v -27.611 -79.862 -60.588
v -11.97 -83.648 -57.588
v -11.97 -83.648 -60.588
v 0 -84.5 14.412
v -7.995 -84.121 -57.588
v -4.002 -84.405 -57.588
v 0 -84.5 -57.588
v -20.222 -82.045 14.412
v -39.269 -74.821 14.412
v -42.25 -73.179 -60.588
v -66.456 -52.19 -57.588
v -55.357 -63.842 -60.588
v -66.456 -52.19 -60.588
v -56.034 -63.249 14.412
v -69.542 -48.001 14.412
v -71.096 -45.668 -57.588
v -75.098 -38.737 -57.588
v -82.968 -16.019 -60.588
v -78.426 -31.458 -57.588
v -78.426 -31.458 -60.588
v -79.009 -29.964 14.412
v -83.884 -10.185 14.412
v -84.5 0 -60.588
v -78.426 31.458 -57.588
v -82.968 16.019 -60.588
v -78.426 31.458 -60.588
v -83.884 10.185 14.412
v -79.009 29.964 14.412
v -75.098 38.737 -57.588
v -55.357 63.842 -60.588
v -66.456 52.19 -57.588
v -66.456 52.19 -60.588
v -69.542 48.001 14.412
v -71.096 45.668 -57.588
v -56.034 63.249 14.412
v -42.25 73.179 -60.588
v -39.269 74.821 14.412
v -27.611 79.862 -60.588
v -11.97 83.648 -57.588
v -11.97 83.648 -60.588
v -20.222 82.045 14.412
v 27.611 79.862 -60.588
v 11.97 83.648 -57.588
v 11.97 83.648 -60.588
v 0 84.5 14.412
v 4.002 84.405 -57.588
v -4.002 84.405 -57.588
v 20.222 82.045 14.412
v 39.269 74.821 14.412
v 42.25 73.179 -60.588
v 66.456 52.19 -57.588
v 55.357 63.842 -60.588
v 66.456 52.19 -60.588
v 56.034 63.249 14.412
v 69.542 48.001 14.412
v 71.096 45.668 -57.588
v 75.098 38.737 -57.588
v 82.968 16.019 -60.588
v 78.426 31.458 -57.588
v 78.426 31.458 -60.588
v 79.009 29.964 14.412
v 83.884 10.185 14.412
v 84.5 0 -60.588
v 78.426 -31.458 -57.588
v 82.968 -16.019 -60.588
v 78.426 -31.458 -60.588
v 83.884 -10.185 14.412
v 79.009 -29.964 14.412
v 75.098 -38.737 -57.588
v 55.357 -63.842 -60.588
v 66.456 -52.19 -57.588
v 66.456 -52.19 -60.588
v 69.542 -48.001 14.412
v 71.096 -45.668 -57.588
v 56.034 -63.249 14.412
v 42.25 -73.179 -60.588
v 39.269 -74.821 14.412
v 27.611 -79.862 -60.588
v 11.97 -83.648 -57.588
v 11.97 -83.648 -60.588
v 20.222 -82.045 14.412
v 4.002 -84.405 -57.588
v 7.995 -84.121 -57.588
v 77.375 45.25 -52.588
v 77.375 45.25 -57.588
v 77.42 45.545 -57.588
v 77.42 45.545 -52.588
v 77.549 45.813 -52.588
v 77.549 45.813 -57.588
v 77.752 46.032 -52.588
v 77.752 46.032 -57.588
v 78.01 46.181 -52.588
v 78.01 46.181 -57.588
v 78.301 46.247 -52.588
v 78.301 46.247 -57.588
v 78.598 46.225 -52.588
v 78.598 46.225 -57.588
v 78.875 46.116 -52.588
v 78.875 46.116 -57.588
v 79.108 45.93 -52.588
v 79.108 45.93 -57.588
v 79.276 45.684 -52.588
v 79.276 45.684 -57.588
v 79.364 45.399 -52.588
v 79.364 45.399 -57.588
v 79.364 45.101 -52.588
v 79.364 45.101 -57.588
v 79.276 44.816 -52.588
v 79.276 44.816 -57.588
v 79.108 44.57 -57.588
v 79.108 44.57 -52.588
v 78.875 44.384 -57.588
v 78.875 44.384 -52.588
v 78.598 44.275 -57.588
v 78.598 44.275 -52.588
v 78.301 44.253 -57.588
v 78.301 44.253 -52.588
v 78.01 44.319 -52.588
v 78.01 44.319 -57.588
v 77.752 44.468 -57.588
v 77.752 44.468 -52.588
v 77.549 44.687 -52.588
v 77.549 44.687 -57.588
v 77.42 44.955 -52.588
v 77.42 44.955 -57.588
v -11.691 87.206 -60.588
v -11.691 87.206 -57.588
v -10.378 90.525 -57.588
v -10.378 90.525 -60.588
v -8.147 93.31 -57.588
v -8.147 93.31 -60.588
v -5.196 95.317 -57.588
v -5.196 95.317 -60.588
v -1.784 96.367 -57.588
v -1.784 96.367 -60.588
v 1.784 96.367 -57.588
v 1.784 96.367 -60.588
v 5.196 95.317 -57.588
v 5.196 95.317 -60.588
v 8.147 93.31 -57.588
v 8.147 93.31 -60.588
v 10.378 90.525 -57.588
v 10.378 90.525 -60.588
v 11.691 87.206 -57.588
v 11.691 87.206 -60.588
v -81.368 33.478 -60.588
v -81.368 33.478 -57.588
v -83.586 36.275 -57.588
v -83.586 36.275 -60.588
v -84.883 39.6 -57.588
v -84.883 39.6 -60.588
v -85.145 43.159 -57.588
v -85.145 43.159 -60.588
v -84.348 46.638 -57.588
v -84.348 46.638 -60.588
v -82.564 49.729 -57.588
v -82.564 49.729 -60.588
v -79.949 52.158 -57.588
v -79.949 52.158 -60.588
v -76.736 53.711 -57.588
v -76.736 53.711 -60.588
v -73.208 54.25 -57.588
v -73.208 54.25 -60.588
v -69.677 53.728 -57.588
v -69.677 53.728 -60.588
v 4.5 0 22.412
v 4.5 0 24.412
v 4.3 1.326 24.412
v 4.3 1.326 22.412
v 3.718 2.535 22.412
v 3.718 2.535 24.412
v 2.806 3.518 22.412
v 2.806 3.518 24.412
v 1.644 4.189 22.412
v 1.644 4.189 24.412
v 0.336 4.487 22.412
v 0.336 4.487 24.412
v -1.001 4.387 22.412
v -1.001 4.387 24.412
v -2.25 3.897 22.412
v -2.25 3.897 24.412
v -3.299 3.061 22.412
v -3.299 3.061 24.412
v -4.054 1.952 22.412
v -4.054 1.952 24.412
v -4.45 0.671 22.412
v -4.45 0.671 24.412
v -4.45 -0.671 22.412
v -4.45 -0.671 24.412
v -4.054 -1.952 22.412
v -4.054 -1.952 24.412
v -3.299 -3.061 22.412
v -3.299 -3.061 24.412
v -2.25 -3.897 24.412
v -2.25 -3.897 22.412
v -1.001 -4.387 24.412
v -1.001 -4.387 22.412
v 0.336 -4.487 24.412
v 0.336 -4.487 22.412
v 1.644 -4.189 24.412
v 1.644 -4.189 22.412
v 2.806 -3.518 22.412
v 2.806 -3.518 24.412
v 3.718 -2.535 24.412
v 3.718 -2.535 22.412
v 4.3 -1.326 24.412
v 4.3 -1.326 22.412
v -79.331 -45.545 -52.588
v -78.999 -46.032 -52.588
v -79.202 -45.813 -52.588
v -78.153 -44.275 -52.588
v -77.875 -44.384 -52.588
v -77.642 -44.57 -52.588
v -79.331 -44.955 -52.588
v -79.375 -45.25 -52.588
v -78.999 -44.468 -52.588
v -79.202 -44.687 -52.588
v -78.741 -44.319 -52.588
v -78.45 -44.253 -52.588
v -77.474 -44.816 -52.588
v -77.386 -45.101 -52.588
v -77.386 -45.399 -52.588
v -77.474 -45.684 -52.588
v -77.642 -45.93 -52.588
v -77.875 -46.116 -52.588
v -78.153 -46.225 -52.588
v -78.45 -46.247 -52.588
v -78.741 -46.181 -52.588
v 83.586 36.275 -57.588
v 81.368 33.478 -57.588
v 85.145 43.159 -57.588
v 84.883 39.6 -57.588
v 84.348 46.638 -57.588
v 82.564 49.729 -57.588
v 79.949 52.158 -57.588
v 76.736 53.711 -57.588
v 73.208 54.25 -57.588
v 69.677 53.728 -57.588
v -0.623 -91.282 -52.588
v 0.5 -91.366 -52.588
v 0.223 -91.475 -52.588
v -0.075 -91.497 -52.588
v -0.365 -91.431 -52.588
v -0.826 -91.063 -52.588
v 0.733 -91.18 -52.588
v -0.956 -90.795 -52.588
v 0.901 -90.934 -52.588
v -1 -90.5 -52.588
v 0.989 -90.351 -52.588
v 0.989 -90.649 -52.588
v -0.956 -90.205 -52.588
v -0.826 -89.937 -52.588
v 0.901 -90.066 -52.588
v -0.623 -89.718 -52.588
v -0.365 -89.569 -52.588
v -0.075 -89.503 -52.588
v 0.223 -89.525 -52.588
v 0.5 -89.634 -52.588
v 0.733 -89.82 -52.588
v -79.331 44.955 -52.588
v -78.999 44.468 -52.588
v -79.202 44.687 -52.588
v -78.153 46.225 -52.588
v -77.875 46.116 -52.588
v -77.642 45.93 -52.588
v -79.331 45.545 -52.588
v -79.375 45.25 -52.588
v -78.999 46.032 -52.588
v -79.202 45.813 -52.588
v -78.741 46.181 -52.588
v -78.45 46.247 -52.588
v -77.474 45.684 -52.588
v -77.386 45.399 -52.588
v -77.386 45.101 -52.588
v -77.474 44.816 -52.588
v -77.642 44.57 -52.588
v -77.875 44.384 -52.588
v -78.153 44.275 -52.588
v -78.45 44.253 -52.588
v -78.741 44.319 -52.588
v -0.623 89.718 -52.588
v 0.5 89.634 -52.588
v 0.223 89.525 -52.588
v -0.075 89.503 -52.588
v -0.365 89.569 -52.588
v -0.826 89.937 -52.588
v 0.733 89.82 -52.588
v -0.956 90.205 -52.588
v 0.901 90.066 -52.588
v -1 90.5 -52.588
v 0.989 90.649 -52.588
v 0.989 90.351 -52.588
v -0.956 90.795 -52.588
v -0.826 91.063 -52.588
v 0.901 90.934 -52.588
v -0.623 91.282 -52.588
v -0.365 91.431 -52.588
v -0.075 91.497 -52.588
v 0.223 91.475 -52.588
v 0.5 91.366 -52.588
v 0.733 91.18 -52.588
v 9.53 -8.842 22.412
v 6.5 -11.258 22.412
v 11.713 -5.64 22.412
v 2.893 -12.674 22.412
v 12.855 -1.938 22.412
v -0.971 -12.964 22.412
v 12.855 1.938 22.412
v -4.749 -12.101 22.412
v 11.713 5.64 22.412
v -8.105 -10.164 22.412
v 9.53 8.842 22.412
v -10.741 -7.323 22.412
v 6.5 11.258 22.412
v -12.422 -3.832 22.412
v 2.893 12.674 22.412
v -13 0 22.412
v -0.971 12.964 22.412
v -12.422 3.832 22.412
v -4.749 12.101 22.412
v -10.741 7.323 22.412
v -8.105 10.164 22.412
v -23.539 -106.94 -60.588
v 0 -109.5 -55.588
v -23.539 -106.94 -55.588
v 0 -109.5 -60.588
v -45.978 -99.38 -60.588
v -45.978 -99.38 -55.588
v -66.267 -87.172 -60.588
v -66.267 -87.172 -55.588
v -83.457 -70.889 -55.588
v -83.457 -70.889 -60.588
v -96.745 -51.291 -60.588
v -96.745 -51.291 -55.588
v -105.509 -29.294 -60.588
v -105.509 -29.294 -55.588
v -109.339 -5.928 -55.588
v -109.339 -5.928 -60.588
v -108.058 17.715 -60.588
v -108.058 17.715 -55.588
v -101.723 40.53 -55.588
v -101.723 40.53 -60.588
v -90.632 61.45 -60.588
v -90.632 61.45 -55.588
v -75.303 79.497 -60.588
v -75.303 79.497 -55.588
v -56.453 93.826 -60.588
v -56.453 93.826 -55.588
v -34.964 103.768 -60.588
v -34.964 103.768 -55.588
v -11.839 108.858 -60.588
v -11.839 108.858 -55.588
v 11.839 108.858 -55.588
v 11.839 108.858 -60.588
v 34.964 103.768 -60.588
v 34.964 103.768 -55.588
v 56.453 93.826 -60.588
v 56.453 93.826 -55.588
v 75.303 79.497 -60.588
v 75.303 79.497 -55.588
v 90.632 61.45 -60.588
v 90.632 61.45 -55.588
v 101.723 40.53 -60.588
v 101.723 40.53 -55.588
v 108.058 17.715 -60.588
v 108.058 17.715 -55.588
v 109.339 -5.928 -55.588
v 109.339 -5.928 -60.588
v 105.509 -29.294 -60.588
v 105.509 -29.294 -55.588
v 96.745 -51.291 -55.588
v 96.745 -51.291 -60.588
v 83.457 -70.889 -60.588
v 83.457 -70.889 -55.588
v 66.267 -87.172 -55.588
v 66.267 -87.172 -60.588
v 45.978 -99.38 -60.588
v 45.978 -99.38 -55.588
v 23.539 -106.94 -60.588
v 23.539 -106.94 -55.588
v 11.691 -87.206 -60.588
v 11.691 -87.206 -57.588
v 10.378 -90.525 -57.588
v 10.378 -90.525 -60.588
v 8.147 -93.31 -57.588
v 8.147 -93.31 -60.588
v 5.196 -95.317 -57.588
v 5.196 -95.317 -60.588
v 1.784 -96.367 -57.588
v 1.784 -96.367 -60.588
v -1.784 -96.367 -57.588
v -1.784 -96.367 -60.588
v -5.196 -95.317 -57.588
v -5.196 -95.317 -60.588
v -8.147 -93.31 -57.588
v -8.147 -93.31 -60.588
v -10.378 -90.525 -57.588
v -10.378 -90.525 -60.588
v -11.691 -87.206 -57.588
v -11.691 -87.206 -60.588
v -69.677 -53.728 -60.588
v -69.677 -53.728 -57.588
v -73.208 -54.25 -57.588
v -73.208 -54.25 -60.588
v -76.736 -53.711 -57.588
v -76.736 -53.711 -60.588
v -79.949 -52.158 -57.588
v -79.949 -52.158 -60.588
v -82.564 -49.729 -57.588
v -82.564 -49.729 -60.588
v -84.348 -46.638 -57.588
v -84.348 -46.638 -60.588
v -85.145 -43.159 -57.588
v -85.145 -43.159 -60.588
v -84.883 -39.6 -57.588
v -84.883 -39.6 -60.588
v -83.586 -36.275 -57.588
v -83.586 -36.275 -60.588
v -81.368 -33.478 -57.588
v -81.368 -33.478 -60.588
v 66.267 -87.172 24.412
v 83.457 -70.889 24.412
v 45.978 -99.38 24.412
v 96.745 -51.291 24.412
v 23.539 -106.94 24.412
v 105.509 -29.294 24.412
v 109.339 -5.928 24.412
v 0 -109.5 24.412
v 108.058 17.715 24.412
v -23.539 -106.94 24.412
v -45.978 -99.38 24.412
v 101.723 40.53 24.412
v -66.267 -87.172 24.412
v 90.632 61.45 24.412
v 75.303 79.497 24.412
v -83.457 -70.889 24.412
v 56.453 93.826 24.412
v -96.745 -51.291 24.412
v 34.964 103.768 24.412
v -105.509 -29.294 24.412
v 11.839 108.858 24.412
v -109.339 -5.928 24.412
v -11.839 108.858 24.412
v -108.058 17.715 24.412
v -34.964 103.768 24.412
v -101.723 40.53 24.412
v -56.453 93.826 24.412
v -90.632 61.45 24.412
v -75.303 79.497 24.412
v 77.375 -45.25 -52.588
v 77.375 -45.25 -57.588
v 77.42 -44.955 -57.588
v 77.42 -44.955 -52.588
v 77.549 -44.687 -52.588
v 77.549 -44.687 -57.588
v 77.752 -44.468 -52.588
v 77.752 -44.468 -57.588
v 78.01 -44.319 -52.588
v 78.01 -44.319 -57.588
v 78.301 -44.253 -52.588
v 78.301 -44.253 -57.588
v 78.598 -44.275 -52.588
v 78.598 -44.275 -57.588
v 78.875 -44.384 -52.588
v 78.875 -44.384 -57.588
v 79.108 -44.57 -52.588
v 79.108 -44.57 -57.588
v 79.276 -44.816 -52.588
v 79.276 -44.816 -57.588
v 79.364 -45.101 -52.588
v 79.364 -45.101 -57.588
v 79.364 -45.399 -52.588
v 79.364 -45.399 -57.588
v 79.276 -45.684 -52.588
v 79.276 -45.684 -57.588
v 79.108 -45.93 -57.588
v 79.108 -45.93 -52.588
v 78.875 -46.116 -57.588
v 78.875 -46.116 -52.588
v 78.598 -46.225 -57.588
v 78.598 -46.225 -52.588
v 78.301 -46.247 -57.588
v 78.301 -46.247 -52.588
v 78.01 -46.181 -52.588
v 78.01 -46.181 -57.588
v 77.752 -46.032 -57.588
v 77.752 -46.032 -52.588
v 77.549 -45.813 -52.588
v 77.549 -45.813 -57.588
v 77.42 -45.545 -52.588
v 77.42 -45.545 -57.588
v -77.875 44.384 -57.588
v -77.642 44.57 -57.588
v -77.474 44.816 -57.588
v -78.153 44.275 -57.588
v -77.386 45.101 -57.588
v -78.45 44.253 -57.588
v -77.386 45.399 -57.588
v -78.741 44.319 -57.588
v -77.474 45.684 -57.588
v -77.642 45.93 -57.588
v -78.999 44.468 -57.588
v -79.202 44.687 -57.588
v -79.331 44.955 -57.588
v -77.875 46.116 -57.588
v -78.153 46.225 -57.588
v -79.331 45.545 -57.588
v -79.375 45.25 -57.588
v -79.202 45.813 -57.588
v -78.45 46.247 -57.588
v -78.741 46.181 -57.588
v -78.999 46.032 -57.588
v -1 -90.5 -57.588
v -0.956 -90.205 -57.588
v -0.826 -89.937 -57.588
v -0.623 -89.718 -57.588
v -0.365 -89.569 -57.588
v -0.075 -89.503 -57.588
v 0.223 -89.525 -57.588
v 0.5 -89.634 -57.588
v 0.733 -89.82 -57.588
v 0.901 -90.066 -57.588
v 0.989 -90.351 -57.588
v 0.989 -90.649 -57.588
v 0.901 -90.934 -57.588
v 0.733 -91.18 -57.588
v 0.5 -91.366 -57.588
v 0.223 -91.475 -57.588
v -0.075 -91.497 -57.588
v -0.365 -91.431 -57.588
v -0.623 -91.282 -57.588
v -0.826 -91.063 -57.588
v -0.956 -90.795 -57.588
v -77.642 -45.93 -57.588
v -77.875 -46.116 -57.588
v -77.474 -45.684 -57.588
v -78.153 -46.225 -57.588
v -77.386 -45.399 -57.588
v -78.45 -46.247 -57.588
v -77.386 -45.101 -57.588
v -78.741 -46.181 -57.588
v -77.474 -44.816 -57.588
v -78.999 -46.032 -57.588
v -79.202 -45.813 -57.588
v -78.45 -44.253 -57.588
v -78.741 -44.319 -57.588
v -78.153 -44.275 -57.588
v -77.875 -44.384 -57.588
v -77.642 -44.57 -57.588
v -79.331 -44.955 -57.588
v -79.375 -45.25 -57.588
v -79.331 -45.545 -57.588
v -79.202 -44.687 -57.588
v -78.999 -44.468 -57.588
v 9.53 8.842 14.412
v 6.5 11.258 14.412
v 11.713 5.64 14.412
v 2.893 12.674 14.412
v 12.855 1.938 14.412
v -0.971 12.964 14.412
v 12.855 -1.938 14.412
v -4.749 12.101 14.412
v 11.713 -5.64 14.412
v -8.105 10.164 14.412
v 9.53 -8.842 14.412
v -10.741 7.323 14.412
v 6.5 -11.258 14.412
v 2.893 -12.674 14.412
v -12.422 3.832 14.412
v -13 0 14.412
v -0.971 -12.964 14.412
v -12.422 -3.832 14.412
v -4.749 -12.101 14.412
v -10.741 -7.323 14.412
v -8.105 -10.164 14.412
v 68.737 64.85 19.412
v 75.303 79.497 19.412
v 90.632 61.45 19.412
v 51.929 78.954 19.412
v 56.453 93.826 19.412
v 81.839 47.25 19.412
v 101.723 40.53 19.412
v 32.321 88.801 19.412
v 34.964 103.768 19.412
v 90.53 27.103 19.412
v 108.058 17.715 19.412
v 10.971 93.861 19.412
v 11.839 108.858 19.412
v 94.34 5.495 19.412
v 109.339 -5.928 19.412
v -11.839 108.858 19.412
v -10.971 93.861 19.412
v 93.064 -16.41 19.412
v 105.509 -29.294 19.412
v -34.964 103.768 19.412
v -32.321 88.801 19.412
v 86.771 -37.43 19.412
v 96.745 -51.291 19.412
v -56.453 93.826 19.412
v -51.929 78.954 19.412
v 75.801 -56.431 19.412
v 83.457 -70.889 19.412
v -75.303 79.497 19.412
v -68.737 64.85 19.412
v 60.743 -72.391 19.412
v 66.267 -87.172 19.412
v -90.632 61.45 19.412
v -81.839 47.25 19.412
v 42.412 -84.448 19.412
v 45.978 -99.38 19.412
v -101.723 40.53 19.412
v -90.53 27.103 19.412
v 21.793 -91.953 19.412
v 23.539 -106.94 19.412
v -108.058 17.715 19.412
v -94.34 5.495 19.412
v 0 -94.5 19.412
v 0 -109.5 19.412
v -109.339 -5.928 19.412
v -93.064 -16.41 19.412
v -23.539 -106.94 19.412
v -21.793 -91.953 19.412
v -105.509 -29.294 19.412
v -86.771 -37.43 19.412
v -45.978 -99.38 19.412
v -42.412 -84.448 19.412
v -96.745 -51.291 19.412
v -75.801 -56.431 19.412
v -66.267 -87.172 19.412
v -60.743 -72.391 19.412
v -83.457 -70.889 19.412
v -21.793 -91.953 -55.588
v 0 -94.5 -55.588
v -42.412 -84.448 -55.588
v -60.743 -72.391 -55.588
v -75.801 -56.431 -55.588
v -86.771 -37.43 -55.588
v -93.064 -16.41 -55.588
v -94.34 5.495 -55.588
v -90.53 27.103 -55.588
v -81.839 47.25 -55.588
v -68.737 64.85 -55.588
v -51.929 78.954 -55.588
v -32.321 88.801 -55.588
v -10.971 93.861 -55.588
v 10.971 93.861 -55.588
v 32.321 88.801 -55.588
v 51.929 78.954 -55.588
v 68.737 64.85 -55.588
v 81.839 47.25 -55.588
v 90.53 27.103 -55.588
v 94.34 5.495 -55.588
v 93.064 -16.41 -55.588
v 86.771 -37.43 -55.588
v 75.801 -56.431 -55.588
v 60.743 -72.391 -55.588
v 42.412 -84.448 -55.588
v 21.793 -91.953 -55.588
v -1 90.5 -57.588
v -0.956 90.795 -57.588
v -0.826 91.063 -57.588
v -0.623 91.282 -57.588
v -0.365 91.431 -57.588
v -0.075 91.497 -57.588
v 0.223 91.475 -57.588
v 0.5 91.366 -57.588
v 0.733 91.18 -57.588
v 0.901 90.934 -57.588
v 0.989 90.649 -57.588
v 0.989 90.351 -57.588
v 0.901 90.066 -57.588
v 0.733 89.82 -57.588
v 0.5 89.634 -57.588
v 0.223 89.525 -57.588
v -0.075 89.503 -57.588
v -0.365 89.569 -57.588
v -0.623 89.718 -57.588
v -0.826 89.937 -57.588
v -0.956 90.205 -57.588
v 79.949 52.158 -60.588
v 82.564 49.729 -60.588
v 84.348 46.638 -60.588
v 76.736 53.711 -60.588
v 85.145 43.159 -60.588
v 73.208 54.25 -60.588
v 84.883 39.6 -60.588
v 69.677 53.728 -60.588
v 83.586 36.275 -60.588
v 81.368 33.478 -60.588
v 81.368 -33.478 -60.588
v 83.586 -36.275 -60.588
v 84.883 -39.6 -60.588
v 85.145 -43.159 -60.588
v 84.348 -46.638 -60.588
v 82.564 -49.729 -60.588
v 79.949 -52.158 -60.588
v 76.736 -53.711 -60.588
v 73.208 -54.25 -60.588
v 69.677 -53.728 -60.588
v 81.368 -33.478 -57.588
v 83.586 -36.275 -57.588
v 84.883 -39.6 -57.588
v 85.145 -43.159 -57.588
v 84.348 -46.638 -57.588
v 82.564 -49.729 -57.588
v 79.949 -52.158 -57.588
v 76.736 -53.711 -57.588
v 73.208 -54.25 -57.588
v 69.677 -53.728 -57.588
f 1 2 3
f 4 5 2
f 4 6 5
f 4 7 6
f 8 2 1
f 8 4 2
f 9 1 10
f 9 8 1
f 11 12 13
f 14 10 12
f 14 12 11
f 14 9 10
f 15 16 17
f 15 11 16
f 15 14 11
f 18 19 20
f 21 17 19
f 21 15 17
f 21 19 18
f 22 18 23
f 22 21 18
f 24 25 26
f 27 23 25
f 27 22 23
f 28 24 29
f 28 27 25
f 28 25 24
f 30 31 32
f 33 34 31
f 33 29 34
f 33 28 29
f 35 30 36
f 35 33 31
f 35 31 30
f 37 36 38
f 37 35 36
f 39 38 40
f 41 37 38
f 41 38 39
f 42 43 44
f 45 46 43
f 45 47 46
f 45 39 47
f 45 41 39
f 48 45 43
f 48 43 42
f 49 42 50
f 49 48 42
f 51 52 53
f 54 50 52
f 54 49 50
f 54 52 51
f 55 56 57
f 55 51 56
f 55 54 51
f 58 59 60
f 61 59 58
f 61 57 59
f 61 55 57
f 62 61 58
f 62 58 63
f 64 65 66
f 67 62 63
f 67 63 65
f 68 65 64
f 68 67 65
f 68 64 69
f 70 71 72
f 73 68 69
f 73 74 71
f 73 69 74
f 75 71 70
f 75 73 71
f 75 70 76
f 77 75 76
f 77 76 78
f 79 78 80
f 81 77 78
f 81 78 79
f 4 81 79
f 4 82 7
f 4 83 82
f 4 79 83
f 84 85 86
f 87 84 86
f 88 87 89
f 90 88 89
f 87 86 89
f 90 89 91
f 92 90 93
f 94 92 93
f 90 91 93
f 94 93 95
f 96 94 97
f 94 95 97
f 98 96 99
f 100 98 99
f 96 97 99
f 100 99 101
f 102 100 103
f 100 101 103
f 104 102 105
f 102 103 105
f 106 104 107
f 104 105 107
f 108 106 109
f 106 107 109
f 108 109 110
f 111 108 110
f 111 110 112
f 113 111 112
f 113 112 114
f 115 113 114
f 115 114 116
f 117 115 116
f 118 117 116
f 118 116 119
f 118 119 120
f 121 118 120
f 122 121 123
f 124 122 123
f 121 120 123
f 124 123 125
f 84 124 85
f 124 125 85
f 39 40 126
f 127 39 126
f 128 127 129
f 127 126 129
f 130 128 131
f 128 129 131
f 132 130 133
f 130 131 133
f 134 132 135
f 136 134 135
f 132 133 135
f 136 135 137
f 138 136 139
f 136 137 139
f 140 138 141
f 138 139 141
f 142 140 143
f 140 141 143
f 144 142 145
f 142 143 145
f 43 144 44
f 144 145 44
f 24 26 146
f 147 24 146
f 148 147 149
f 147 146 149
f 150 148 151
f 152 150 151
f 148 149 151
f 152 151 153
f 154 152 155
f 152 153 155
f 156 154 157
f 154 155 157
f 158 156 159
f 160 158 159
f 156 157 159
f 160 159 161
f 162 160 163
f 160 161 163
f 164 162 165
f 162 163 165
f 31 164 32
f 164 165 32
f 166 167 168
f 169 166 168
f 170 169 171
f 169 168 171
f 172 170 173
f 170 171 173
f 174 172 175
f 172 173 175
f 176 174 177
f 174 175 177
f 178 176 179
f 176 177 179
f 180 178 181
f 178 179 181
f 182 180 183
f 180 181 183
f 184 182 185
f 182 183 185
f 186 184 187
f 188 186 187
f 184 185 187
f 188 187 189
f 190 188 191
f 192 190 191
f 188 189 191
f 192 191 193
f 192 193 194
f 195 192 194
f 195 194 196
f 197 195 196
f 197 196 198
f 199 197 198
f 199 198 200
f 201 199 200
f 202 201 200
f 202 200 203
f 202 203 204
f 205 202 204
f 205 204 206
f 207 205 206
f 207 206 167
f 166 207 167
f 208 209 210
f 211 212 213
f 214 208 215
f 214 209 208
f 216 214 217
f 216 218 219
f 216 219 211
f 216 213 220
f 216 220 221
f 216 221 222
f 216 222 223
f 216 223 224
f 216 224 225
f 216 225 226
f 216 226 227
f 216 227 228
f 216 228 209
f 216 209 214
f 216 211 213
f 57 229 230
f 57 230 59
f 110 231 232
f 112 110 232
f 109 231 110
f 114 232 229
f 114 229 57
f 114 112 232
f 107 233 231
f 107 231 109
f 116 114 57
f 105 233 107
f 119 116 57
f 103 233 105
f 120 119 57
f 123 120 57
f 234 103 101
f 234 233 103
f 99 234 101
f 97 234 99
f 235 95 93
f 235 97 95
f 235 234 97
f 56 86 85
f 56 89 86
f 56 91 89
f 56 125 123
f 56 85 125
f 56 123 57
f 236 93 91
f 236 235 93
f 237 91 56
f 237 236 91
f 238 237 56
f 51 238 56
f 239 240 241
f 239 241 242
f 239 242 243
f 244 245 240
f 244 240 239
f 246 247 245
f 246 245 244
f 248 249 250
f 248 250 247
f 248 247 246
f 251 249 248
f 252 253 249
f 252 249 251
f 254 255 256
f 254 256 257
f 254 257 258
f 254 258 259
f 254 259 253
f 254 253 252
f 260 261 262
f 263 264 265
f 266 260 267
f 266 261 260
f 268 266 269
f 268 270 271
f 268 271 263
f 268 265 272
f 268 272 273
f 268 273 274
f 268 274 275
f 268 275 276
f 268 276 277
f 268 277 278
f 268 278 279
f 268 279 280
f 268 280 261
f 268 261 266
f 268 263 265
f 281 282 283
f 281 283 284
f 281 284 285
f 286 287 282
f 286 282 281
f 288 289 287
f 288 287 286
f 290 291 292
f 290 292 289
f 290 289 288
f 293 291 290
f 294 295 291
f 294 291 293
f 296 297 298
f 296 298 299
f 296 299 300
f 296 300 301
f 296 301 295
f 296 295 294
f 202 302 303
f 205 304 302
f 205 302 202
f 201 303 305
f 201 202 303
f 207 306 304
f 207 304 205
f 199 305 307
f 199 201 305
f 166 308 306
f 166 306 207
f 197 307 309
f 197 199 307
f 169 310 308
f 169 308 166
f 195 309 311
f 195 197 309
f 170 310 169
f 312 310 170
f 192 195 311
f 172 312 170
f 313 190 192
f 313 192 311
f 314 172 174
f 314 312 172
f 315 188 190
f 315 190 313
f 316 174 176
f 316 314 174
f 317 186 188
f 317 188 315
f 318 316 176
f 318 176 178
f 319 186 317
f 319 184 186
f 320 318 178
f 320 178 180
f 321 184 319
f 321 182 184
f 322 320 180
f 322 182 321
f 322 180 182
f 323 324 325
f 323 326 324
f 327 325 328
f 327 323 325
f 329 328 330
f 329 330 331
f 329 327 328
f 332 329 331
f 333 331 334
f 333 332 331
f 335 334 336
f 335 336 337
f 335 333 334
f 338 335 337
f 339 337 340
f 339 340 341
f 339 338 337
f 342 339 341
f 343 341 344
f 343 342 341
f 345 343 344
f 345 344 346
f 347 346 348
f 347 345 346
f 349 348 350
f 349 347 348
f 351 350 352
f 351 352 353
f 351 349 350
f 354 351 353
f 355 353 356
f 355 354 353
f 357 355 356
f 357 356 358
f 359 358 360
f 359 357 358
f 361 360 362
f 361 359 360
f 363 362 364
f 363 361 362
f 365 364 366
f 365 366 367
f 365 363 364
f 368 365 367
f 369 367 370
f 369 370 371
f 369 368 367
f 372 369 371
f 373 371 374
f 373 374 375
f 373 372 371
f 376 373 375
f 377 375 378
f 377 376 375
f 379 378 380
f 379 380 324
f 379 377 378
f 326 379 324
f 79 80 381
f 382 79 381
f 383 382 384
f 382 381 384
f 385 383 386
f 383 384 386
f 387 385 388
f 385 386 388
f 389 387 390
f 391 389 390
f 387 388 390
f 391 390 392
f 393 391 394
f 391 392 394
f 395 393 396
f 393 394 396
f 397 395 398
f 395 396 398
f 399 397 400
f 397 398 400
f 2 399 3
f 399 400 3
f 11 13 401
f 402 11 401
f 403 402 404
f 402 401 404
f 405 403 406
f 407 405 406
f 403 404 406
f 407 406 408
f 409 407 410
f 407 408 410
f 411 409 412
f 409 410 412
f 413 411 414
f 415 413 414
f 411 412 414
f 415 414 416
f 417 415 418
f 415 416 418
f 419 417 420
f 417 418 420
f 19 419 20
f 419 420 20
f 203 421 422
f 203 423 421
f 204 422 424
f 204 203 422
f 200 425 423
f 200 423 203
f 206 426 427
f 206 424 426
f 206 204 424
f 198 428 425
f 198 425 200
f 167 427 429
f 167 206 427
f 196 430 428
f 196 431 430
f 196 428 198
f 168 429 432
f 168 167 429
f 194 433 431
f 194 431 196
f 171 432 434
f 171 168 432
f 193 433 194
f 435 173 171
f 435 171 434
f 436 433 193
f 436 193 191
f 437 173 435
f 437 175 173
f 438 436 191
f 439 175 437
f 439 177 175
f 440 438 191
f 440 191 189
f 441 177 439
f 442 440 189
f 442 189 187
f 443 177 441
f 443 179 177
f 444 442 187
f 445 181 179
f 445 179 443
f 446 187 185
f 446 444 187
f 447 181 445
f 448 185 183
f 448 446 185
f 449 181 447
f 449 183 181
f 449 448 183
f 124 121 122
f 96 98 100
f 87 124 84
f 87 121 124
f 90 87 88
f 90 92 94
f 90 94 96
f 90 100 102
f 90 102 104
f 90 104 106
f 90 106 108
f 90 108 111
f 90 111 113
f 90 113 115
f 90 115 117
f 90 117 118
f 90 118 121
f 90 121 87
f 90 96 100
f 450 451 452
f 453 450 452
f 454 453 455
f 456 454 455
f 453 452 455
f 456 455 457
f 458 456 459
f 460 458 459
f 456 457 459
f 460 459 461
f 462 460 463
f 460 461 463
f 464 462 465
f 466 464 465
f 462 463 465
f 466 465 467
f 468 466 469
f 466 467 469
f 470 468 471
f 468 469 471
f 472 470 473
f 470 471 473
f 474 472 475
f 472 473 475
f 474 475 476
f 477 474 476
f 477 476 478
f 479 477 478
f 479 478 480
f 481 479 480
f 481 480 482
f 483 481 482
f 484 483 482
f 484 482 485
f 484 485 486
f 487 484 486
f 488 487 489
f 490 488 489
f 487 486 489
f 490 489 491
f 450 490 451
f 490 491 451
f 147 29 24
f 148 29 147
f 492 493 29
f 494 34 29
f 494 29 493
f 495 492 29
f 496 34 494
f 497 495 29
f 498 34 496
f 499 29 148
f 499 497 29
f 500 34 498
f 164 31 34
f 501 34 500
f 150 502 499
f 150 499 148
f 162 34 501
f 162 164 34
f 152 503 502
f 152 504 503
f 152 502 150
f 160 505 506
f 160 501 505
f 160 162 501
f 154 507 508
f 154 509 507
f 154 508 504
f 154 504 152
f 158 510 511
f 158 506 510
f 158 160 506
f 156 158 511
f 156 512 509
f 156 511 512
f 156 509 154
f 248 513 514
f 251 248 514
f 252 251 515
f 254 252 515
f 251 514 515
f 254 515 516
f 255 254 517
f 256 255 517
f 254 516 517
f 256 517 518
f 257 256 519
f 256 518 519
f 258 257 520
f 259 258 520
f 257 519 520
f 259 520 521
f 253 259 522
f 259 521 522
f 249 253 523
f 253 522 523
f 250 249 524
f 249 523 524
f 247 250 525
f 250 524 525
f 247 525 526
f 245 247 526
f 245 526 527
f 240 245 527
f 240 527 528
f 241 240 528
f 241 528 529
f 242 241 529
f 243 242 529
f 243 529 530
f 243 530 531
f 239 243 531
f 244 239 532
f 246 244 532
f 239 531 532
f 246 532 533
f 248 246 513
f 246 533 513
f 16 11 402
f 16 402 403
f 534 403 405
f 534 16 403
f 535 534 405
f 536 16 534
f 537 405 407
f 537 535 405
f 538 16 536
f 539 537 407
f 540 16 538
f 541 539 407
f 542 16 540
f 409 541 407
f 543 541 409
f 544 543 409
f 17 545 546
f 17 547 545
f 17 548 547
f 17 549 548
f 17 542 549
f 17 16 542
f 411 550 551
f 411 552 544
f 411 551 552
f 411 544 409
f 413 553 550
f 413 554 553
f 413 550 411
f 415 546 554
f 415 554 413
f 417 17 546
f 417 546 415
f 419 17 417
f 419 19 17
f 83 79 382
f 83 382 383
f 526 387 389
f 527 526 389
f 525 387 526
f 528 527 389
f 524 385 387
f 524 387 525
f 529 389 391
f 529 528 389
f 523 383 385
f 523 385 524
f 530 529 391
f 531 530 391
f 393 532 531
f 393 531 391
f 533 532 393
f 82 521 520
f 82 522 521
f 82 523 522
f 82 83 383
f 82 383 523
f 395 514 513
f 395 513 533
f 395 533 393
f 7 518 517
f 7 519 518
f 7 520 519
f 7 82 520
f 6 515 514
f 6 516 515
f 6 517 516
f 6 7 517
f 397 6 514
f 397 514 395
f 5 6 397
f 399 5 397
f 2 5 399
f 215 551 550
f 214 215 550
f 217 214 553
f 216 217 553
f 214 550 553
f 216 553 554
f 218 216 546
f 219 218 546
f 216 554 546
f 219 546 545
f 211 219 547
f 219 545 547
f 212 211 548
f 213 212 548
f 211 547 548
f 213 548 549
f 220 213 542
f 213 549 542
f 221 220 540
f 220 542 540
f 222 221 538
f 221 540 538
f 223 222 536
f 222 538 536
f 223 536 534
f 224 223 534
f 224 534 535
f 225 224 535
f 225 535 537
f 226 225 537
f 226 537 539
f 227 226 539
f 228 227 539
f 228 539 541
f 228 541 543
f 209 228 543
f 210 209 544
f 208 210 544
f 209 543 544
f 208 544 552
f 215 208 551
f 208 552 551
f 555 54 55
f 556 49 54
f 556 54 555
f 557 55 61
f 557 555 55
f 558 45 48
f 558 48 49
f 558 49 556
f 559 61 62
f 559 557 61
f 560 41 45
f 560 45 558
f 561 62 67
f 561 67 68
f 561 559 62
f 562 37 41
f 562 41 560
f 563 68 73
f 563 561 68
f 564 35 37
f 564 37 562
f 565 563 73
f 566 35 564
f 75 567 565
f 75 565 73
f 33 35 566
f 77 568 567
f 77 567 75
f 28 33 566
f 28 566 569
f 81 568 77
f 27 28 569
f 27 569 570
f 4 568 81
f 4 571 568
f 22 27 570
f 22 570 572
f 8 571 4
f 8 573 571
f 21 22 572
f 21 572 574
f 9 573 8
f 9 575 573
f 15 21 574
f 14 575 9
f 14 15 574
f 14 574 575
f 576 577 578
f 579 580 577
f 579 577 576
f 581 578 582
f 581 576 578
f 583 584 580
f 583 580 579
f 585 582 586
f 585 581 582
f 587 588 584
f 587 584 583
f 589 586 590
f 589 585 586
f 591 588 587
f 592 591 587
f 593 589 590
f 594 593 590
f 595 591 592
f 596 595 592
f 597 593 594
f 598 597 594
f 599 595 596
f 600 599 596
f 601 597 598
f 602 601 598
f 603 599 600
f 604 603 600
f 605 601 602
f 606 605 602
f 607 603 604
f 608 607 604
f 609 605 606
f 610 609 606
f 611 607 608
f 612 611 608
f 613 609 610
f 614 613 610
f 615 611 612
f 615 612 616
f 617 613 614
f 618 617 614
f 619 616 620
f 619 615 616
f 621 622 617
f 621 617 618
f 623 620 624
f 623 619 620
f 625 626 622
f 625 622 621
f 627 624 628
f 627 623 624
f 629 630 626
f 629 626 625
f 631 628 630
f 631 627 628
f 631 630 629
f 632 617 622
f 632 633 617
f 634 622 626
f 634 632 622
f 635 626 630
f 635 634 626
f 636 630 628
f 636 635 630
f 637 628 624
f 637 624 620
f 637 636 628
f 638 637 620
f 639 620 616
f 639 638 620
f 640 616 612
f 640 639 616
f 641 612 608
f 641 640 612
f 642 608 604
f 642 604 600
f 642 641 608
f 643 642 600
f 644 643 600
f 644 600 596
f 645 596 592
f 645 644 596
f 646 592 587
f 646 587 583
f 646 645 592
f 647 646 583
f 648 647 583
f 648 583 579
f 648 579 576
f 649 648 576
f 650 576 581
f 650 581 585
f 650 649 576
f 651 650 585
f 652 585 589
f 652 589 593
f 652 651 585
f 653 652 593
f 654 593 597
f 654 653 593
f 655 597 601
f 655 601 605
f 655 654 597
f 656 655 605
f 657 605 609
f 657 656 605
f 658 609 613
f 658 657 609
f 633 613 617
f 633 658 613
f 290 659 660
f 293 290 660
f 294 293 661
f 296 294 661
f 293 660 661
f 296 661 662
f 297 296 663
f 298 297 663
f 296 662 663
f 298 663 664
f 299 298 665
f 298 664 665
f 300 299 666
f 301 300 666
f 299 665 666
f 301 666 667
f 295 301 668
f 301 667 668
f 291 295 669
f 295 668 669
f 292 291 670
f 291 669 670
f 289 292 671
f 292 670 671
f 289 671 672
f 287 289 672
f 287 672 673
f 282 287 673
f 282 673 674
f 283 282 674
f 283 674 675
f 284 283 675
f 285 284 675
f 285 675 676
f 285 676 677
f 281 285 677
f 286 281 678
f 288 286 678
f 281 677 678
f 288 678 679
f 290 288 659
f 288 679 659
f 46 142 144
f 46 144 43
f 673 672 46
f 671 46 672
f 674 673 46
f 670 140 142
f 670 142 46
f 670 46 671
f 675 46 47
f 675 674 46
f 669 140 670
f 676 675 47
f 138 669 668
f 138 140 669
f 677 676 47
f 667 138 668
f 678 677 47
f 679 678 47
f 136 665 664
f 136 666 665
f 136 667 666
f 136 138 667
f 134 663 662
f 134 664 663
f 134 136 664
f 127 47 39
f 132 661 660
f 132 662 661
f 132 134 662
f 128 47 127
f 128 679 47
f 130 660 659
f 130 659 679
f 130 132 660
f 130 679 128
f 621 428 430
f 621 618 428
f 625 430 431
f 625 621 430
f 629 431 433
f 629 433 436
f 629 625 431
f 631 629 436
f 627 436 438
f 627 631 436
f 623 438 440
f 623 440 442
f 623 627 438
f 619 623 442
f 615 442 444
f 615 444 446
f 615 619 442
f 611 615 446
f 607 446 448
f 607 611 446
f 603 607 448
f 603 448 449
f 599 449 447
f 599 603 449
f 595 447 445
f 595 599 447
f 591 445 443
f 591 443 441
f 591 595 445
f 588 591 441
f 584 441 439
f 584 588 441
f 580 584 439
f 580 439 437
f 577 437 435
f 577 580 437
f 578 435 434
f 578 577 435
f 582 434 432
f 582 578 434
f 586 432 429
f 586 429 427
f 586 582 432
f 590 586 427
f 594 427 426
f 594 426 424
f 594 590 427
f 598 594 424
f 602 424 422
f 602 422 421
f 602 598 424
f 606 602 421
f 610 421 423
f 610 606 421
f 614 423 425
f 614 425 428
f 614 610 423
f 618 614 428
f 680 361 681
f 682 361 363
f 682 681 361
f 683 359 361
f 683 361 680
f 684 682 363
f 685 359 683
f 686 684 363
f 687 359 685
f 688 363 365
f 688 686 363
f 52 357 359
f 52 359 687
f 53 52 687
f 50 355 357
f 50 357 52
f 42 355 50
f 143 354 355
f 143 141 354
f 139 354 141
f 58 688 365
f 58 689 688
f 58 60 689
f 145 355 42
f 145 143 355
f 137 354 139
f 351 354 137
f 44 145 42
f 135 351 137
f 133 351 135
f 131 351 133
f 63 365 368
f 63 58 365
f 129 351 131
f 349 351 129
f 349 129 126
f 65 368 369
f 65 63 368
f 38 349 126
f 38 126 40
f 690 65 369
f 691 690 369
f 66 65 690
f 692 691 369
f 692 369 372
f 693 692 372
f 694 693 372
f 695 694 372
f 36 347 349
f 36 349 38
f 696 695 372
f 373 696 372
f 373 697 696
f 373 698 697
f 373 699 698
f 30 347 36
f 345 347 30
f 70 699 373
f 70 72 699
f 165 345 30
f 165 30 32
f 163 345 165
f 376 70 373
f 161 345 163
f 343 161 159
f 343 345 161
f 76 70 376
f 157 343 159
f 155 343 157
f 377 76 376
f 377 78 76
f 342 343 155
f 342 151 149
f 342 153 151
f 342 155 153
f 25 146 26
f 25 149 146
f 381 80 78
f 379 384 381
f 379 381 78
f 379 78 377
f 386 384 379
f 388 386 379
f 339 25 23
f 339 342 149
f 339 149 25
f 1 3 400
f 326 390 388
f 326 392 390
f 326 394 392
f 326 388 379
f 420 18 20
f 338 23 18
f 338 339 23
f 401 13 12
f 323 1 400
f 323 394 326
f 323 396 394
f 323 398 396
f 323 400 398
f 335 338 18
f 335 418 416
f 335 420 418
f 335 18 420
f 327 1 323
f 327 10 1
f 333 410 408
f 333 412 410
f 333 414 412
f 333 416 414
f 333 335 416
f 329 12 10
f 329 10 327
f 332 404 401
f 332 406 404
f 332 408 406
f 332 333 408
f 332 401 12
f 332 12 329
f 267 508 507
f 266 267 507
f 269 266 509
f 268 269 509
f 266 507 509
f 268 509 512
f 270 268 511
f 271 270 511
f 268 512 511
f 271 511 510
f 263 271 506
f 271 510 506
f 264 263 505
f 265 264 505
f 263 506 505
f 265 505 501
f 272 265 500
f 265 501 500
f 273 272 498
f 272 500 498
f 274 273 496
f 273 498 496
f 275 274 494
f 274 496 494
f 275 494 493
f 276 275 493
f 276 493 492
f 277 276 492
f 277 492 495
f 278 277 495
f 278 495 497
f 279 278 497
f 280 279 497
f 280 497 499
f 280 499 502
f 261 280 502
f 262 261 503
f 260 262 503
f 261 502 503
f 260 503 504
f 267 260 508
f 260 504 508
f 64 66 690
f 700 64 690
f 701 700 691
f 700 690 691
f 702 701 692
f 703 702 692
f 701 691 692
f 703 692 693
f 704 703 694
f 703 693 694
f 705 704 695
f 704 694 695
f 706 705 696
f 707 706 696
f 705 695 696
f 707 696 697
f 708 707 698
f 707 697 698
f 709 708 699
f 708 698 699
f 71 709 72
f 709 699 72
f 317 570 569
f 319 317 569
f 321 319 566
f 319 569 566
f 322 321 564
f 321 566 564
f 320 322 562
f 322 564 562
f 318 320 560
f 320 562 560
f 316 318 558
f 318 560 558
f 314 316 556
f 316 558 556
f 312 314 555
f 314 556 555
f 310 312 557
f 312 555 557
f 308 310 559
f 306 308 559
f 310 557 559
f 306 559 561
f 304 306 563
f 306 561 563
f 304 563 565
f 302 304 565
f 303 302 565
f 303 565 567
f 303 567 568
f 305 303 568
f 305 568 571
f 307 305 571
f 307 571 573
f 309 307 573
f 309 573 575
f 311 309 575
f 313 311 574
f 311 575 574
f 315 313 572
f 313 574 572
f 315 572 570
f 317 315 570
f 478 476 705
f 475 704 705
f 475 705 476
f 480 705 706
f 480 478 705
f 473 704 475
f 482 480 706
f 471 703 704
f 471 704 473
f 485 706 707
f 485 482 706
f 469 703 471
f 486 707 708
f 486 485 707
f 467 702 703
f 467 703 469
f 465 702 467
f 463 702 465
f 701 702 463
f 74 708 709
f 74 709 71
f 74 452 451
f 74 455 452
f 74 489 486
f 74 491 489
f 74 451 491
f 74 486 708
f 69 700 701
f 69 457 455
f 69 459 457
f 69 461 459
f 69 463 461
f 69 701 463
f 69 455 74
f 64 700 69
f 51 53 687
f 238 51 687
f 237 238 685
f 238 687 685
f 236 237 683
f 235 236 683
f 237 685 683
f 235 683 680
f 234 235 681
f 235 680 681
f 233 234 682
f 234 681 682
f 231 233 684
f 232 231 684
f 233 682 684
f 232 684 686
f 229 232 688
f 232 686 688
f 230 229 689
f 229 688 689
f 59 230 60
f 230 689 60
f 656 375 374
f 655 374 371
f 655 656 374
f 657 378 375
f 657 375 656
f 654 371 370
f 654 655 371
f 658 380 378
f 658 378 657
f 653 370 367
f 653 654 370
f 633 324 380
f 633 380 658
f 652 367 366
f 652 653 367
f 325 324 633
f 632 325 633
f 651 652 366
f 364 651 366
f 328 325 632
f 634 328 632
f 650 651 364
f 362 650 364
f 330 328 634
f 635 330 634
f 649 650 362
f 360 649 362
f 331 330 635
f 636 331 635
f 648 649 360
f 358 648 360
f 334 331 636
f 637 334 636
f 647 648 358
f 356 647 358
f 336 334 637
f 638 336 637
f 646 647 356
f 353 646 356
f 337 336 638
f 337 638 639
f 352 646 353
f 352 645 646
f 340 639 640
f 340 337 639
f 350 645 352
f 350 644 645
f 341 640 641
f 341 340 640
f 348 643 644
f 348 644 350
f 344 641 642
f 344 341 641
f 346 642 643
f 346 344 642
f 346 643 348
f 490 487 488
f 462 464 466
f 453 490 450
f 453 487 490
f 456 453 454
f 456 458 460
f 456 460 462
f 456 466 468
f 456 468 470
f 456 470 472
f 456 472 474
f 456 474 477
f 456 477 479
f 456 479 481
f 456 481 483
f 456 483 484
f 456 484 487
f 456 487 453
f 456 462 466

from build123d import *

# Parameters (mm, degrees)
SKETCH5_R          = 4.5
CUT_EXTRUDE1_DEPTH = 86
SKETCH6_R          = 13
CUT_EXTRUDE2_DEPTH = 8
CUT_EXTRUDE4_DEPTH = 3
SKETCH9_R          = 1
CUT_EXTRUDE5_DEPTH = 5


with BuildPart() as part:
    # Sketch3 → Revolve1 (revolve)
    with BuildSketch(Plane(origin=(0, 0, 0), x_dir=(0, 0, -1), z_dir=(1, 0, 0))):
        Polygon((-24.411764706, 0), (-24.411764706, -109.5), (-19.411764706, -109.5), (-19.411764706, -94.5), (55.588235294, -94.5), (55.588235294, -109.5), (60.588235294, -109.5), (60.588235294, -84.5), (-14.411764706, -84.5), (-14.411764706, 0), align=None)
    revolve(axis=Axis((0, 0, 33.897058824), (0, 0, -1)))

    # Sketch5 → Cut-Extrude1 (cut, through all)
    with BuildSketch(Plane.XY.offset(24.411764706)):
        Circle(SKETCH5_R)
    extrude(amount=-CUT_EXTRUDE1_DEPTH, mode=Mode.SUBTRACT)

    # Sketch6 → Cut-Extrude2 (cut)
    with BuildSketch(Plane(origin=(0, 0, 14.411764706), x_dir=(-1, 0, 0), z_dir=(0, 0, -1))):
        Circle(SKETCH6_R)
    extrude(amount=-CUT_EXTRUDE2_DEPTH, mode=Mode.SUBTRACT)

    # Sketch8 → Cut-Extrude4 (cut)
    with BuildSketch(Plane(origin=(0, 0, -60.588235294), x_dir=(-1, 0, 0), z_dir=(0, 0, -1))):
        with BuildLine():
            ThreePointArc((11.969710732, 83.647928994), (0, 96.5), (-11.969710732, 83.647928994))
            ThreePointArc((-11.969710732, 83.647928994), (0, 84.5), (11.969710732, 83.647928994))
        make_face()
        with BuildLine():
            ThreePointArc((78.426086849, 31.457890927), (83.571451465, 48.25), (66.456376117, 52.190038067))
            ThreePointArc((66.456376117, 52.190038067), (73.17914662, 42.25), (78.426086849, 31.457890927))
        make_face()
        with BuildLine():
            ThreePointArc((66.456376117, -52.190038067), (83.571451465, -48.25), (78.426086849, -31.457890927))
            ThreePointArc((78.426086849, -31.457890927), (73.17914662, -42.25), (66.456376117, -52.190038067))
        make_face()
        with BuildLine():
            ThreePointArc((-11.969710732, -83.647928994), (0, -96.5), (11.969710732, -83.647928994))
            ThreePointArc((11.969710732, -83.647928994), (0, -84.5), (-11.969710732, -83.647928994))
        make_face()
        with BuildLine():
            ThreePointArc((-78.426086849, -31.457890927), (-83.571451465, -48.25), (-66.456376117, -52.190038067))
            ThreePointArc((-66.456376117, -52.190038067), (-73.17914662, -42.25), (-78.426086849, -31.457890927))
        make_face()
        with BuildLine():
            ThreePointArc((-66.456376117, 52.190038067), (-83.571451465, 48.25), (-78.426086849, 31.457890927))
            ThreePointArc((-78.426086849, 31.457890927), (-73.17914662, 42.25), (-66.456376117, 52.190038067))
        make_face()
    extrude(amount=-CUT_EXTRUDE4_DEPTH, mode=Mode.SUBTRACT)

    # Sketch9 → Cut-Extrude5 (cut)
    with BuildSketch(Plane(origin=(0, 0, -57.588235294), x_dir=(-1, 0, 0), z_dir=(0, 0, -1))):
        with Locations((0, 90.5)):
            Circle(SKETCH9_R)
        with Locations((78.375299042, 45.25)):
            Circle(SKETCH9_R)
        with Locations((78.375299042, -45.25)):
            Circle(SKETCH9_R)
        with Locations((0, -90.5)):
            Circle(SKETCH9_R)
        with Locations((-78.375299042, -45.25)):
            Circle(SKETCH9_R)
        with Locations((-78.375299042, 45.25)):
            Circle(SKETCH9_R)
    extrude(amount=-CUT_EXTRUDE5_DEPTH, mode=Mode.SUBTRACT)


solid = part.part
